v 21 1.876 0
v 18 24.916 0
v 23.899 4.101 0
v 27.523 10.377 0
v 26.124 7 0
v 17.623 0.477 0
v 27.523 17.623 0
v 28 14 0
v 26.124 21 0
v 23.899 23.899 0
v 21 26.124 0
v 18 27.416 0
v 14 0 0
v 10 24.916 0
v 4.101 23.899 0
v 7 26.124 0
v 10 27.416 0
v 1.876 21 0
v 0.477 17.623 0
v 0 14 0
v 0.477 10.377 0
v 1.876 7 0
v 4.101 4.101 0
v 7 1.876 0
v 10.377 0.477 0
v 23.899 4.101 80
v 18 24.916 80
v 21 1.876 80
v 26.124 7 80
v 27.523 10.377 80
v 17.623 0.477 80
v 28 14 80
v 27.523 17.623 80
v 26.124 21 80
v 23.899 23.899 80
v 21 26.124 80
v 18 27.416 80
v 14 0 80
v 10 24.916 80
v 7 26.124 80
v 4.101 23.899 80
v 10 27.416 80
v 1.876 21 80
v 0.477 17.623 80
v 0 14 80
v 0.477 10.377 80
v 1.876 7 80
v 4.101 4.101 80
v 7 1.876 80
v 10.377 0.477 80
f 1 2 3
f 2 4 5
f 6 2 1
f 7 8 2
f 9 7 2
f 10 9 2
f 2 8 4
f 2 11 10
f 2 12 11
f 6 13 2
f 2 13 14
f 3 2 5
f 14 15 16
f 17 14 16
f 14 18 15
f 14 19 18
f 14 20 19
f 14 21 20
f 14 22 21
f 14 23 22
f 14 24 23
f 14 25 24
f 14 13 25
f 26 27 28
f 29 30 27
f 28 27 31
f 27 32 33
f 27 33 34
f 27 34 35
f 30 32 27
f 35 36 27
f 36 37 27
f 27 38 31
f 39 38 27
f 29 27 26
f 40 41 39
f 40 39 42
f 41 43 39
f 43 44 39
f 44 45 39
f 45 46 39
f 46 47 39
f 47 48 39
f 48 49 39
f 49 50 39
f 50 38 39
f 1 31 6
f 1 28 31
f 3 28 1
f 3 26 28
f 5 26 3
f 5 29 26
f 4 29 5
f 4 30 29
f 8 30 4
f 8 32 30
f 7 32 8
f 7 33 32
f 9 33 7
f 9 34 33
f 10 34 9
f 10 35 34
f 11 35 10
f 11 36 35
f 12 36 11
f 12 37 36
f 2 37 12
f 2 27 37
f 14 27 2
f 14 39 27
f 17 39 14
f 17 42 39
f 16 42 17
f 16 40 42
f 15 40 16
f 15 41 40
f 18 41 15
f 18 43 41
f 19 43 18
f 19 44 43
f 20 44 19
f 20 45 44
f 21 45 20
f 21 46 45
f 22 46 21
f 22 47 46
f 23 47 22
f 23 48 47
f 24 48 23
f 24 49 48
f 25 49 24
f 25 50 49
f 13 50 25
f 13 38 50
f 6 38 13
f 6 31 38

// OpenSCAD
$fn = 32;

// ----------------------------------------------------------------------
// Keyway shaft: d28 shaft, key 8 x 2.5 mm
// ----------------------------------------------------------------------

// --- parameters (mm) ---
shaft_r = 14;             // shaft radius
key_w = 8;                // keyway width
key_d = 2.5;              // keyway depth below the surface line
plate_t = 80;             // shaft length, Z (extrusion height)

shaft_d = 2 * shaft_r;  // shaft diameter
circle_step = 15;  // polygon sampling step, degrees

profile = [[7, 26.124], [4.101, 23.899], [1.876, 21], [0.477, 17.623], [0, 14], [0.477, 10.377], [1.876, 7], [4.101, 4.101], [7, 1.876], [10.377, 0.477], [14, 0], [17.623, 0.477], [21, 1.876], [23.899, 4.101], [26.124, 7], [27.523, 10.377], [28, 14], [27.523, 17.623], [26.124, 21], [23.899, 23.899], [21, 26.124], [18, 27.416], [18, 24.916], [10, 24.916], [10, 27.416]];  // primary outline, 25 points, counter clockwise

// --- the one profile operation ---
linear_extrude(height = plate_t) polygon(points = profile);
